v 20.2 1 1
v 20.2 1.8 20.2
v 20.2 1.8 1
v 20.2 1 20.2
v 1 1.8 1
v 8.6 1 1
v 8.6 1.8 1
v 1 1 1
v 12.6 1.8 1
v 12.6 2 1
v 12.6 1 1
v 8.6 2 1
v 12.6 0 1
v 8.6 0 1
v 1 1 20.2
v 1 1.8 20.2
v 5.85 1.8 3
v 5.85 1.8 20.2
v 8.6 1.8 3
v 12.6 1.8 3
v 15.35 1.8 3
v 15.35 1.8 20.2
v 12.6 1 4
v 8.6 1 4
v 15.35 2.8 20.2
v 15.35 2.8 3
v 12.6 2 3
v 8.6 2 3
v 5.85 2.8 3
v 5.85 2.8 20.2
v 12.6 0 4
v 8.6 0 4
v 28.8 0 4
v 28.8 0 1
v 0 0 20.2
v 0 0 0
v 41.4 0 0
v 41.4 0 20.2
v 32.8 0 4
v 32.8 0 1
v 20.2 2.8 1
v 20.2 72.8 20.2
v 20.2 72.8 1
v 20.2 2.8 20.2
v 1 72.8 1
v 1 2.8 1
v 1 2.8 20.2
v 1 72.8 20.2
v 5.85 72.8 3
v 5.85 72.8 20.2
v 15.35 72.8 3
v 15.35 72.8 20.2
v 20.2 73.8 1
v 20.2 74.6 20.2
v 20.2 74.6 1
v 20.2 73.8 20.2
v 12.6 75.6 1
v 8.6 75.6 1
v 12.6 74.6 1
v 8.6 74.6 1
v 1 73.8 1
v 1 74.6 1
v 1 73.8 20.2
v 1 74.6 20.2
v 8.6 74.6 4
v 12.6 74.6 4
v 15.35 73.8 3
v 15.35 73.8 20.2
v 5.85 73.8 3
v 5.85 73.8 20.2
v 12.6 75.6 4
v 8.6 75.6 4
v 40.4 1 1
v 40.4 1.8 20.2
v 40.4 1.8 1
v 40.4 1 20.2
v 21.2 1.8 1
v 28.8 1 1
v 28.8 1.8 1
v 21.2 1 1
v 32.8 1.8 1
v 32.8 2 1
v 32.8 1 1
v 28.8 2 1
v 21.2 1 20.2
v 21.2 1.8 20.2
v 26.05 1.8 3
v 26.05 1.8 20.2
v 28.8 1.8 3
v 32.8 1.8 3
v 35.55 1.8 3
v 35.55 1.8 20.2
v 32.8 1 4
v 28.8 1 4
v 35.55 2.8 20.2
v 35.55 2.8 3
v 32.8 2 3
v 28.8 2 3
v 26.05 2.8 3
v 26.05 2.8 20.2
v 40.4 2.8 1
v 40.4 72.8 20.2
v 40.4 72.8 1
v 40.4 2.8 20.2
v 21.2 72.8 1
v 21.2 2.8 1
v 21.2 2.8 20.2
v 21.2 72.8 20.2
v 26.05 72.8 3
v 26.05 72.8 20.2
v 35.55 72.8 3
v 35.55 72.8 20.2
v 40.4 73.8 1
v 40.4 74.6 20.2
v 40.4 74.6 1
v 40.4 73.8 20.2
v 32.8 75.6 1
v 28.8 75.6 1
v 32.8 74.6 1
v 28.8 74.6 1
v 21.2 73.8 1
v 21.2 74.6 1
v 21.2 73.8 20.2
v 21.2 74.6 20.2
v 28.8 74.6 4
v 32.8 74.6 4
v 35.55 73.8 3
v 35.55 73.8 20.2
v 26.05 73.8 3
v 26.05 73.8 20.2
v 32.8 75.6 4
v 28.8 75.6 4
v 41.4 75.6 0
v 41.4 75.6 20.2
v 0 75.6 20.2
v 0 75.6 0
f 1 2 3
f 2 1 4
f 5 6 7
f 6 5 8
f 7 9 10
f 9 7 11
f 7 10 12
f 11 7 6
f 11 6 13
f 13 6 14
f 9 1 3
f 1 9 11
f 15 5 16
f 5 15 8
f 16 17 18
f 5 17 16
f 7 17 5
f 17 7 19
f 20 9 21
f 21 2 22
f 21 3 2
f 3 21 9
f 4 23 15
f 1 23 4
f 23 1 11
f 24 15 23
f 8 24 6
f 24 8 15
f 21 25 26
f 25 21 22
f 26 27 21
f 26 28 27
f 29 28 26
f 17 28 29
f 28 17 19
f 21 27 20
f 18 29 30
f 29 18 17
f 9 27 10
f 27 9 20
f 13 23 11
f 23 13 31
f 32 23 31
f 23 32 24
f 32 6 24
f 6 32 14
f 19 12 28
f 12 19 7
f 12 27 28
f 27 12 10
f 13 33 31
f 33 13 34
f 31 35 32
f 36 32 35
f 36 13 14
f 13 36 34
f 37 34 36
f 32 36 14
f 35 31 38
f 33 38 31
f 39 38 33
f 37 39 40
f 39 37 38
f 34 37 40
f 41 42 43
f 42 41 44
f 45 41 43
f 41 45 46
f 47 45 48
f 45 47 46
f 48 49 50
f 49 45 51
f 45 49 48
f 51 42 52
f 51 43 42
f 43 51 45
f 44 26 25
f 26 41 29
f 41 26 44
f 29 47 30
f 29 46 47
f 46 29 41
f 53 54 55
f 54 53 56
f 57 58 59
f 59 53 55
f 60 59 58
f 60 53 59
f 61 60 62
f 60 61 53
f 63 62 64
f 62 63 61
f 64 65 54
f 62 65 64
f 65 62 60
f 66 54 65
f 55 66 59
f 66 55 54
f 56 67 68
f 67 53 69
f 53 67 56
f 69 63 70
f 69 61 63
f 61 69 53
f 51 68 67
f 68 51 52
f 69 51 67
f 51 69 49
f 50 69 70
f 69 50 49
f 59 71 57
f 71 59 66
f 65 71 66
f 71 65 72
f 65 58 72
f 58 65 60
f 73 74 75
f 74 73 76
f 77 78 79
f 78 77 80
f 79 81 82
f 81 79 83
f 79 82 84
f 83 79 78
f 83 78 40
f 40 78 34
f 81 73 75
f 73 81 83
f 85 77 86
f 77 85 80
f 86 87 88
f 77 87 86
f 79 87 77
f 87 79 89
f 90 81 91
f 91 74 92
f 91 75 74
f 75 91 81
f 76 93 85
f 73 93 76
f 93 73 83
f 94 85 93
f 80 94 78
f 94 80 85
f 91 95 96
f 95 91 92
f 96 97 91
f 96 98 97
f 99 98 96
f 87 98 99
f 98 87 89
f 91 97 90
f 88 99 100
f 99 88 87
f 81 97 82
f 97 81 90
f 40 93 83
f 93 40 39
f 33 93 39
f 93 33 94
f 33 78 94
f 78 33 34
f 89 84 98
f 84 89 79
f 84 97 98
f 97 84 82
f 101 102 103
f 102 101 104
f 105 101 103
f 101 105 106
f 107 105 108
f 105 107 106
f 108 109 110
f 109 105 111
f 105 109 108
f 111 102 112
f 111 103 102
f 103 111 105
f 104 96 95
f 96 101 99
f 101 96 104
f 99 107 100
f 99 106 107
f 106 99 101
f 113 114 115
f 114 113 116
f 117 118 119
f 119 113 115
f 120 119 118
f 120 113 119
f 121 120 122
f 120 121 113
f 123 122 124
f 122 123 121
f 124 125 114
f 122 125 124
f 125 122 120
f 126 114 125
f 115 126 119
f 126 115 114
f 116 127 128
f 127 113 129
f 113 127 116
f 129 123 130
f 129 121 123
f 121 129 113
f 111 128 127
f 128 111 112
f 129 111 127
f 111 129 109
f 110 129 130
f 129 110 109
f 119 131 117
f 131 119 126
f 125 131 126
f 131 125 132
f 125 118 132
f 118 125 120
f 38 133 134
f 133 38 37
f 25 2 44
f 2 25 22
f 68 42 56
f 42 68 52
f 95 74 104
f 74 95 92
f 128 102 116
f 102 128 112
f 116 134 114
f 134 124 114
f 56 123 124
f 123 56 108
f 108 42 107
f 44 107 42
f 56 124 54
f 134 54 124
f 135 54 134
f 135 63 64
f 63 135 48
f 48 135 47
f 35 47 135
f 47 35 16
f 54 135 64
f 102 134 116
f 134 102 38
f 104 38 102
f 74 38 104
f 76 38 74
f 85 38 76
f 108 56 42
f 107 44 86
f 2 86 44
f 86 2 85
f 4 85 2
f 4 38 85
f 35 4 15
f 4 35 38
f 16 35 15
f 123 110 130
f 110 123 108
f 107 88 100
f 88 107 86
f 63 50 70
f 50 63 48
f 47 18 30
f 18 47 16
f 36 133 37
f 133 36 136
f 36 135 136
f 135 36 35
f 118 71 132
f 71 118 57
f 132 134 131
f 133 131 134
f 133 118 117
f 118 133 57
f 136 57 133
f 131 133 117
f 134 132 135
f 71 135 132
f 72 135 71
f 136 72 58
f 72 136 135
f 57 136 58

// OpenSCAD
inch = 25.4;
battery_type = "18650";

//aaa
    battery_length = 45;
    battery_width = 10.5;
    spring_space = 4;
    contact_width = 4;
    tab_width = 4;

//18650
    battery_length = 65;
    battery_width = 18.2;
    spring_space = 5;
    contact_width = 9.5;
    tab_width = 4;


wall_thick = 1.0;
electrode_thick = .8;

battery_recess_length = battery_length+spring_space;
battery_recess_width = battery_width+1*wall_thick;

module box(numcells){
    difference(){
        cube([(battery_recess_width)*numcells+(numcells+1)*wall_thick,
            battery_recess_length+(4*wall_thick)+2*electrode_thick,
            battery_width+2*wall_thick]);
        for (x = [wall_thick: battery_width+2*wall_thick: ((2*wall_thick+1+battery_width))*numcells]){
            translate([x, wall_thick,wall_thick]){
                electrode_recess();
                translate([battery_recess_width/2-contact_width/2,electrode_thick,2])
                    cube([contact_width,4,battery_width+wall_thick]); //hole for electrode
                translate([battery_recess_width/2-2,-wall_thick,0])
                    cube([tab_width,2,3]); //hole for tab
                translate([0,electrode_thick+wall_thick,0])battery_recess();
                translate([0,electrode_thick+2*wall_thick+battery_recess_length,0])
                    electrode_recess();
                translate([battery_recess_width/2-contact_width/2,wall_thick+battery_recess_length,2])
                    cube([contact_width,2,battery_width+wall_thick]); //hole for electrode
                translate([battery_recess_width/2-tab_width/2,2*wall_thick+battery_recess_length+electrode_thick,0])
                    cube([tab_width,4,3]); //hole for tab
            }
            
        }
    }
}
module electrode_recess(){
            cube([battery_recess_width,
              electrode_thick,
              battery_width+3*wall_thick]);
}
module battery_recess(){
    cube([battery_recess_width,
          battery_recess_length,
          battery_width+3*wall_thick]);
}

box(2);
 
